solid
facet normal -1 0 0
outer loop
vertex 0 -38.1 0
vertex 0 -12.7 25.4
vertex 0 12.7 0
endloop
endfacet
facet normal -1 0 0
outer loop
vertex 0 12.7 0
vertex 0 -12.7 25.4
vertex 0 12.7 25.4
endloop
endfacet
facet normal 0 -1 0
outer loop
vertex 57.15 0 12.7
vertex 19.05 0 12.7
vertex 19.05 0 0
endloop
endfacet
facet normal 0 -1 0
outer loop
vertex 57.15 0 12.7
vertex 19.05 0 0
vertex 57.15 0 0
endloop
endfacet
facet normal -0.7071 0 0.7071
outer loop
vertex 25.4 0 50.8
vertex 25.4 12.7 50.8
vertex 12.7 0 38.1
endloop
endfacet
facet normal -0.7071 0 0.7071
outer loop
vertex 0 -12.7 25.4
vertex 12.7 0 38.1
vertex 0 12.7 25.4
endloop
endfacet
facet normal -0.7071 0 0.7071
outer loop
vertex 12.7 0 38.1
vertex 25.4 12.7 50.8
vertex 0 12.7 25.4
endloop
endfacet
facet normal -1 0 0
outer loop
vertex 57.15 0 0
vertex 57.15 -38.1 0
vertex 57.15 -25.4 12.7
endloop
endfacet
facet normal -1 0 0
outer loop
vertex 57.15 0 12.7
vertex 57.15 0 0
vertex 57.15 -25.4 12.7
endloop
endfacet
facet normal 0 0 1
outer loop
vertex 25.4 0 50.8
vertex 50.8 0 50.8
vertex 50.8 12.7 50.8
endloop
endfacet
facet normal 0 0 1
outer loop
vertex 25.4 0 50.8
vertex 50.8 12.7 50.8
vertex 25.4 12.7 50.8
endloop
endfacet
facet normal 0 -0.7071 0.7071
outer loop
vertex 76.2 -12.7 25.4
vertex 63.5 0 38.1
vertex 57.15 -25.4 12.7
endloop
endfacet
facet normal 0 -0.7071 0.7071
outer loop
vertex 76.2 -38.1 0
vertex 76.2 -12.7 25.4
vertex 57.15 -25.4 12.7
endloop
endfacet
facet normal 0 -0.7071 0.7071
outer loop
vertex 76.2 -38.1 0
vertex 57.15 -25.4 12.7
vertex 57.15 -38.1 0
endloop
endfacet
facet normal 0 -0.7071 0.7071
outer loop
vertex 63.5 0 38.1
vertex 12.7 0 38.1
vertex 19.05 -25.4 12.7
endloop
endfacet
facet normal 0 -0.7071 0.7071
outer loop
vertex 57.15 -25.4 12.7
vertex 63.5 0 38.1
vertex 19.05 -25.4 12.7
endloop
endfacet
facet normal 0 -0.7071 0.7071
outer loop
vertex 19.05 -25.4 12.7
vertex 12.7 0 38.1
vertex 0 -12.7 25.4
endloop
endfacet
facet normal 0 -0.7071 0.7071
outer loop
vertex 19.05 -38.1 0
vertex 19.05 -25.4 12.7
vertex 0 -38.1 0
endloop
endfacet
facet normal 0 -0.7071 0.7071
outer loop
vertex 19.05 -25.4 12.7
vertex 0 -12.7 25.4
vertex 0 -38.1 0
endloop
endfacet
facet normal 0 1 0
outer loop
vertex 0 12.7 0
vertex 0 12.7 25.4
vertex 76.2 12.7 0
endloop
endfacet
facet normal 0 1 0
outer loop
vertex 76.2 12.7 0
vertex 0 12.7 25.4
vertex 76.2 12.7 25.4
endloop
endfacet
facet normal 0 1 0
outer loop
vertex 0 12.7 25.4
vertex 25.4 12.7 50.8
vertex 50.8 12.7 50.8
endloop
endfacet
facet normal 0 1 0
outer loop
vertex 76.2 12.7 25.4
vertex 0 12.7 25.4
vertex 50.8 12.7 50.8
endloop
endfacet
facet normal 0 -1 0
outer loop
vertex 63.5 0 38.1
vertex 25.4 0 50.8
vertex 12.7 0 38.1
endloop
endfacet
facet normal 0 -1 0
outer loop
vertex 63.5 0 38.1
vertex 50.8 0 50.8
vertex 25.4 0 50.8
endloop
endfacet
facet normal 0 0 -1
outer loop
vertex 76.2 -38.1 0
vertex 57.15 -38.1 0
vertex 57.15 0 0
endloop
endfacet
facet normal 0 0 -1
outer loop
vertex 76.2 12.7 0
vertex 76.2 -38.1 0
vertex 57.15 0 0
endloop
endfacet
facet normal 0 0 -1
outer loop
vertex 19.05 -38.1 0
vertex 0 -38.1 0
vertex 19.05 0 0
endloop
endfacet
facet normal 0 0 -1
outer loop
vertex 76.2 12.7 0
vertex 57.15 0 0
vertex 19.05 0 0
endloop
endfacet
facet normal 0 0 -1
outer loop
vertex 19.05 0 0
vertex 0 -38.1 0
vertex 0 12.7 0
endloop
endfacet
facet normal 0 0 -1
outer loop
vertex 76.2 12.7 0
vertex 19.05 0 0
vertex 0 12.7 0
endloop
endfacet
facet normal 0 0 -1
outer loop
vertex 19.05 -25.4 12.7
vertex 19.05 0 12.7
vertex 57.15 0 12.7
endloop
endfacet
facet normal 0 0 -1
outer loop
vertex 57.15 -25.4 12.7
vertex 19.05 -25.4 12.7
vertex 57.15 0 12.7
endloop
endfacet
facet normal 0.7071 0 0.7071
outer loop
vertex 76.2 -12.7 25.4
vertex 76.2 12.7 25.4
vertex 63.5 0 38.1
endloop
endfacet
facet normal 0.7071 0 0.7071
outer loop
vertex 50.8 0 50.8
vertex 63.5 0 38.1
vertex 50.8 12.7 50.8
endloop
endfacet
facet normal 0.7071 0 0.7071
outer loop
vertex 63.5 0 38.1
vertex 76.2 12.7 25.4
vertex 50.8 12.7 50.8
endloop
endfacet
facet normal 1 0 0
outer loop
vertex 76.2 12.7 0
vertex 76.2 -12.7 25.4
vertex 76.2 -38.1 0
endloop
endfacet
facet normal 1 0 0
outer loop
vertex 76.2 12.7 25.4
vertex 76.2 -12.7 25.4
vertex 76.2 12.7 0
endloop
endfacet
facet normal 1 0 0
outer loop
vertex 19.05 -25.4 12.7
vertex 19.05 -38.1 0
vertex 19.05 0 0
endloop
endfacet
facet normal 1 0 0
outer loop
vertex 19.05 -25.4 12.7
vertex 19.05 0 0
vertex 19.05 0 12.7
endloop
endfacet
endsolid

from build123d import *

# Parameters (mm, degrees)
F0_W     = 38.1
F0_H     = 12.7
F1_DEPTH = 12.7
F3_DEPTH = 76.2
F4_DEPTH = 38.101
F5_DEPTH = 38.101


with BuildPart() as f1:
    # F0 (on Front) → F1 (new body)
    with BuildSketch(Plane.XZ):
        Polygon((0, 25.4), (0, 0), (38.1, 38.1), (76.2, 0), (76.2, 25.4), (50.8, 50.8), (25.4, 50.8), align=None)
        Polygon((38.1, 38.1), (0, 0), (19.05, 0), (19.05, 12.7), (57.15, 12.7), (57.15, 0), (76.2, 0), align=None)
        with Locations((38.1, 6.35)):
            Rectangle(F0_W, F0_H)
    extrude(amount=-F1_DEPTH)

    # F2 (on Right) → F3 (join)
    with BuildSketch(Plane.YZ):
        Polygon((-38.1, 0), (0, 0), (0, 38.1), align=None)
    extrude(amount=F3_DEPTH)

    # F4 (cut, through all): faces of the model
    f4_faces = [f1.faces().sort_by_distance(p)[0] for p in [
        (4.2333333333, 0, 33.8666666667),
        (71.9666666667, 0, 33.8666666667),
    ]]
    extrude(f4_faces, amount=-F4_DEPTH, mode=Mode.SUBTRACT)

    # F0 (on Front) → F5 (cut, through all)
    with BuildSketch(Plane.XZ):
        with Locations((38.1, 6.35)):
            Rectangle(F0_W, F0_H)
    extrude(amount=F5_DEPTH, mode=Mode.SUBTRACT)


solid = f1.part
